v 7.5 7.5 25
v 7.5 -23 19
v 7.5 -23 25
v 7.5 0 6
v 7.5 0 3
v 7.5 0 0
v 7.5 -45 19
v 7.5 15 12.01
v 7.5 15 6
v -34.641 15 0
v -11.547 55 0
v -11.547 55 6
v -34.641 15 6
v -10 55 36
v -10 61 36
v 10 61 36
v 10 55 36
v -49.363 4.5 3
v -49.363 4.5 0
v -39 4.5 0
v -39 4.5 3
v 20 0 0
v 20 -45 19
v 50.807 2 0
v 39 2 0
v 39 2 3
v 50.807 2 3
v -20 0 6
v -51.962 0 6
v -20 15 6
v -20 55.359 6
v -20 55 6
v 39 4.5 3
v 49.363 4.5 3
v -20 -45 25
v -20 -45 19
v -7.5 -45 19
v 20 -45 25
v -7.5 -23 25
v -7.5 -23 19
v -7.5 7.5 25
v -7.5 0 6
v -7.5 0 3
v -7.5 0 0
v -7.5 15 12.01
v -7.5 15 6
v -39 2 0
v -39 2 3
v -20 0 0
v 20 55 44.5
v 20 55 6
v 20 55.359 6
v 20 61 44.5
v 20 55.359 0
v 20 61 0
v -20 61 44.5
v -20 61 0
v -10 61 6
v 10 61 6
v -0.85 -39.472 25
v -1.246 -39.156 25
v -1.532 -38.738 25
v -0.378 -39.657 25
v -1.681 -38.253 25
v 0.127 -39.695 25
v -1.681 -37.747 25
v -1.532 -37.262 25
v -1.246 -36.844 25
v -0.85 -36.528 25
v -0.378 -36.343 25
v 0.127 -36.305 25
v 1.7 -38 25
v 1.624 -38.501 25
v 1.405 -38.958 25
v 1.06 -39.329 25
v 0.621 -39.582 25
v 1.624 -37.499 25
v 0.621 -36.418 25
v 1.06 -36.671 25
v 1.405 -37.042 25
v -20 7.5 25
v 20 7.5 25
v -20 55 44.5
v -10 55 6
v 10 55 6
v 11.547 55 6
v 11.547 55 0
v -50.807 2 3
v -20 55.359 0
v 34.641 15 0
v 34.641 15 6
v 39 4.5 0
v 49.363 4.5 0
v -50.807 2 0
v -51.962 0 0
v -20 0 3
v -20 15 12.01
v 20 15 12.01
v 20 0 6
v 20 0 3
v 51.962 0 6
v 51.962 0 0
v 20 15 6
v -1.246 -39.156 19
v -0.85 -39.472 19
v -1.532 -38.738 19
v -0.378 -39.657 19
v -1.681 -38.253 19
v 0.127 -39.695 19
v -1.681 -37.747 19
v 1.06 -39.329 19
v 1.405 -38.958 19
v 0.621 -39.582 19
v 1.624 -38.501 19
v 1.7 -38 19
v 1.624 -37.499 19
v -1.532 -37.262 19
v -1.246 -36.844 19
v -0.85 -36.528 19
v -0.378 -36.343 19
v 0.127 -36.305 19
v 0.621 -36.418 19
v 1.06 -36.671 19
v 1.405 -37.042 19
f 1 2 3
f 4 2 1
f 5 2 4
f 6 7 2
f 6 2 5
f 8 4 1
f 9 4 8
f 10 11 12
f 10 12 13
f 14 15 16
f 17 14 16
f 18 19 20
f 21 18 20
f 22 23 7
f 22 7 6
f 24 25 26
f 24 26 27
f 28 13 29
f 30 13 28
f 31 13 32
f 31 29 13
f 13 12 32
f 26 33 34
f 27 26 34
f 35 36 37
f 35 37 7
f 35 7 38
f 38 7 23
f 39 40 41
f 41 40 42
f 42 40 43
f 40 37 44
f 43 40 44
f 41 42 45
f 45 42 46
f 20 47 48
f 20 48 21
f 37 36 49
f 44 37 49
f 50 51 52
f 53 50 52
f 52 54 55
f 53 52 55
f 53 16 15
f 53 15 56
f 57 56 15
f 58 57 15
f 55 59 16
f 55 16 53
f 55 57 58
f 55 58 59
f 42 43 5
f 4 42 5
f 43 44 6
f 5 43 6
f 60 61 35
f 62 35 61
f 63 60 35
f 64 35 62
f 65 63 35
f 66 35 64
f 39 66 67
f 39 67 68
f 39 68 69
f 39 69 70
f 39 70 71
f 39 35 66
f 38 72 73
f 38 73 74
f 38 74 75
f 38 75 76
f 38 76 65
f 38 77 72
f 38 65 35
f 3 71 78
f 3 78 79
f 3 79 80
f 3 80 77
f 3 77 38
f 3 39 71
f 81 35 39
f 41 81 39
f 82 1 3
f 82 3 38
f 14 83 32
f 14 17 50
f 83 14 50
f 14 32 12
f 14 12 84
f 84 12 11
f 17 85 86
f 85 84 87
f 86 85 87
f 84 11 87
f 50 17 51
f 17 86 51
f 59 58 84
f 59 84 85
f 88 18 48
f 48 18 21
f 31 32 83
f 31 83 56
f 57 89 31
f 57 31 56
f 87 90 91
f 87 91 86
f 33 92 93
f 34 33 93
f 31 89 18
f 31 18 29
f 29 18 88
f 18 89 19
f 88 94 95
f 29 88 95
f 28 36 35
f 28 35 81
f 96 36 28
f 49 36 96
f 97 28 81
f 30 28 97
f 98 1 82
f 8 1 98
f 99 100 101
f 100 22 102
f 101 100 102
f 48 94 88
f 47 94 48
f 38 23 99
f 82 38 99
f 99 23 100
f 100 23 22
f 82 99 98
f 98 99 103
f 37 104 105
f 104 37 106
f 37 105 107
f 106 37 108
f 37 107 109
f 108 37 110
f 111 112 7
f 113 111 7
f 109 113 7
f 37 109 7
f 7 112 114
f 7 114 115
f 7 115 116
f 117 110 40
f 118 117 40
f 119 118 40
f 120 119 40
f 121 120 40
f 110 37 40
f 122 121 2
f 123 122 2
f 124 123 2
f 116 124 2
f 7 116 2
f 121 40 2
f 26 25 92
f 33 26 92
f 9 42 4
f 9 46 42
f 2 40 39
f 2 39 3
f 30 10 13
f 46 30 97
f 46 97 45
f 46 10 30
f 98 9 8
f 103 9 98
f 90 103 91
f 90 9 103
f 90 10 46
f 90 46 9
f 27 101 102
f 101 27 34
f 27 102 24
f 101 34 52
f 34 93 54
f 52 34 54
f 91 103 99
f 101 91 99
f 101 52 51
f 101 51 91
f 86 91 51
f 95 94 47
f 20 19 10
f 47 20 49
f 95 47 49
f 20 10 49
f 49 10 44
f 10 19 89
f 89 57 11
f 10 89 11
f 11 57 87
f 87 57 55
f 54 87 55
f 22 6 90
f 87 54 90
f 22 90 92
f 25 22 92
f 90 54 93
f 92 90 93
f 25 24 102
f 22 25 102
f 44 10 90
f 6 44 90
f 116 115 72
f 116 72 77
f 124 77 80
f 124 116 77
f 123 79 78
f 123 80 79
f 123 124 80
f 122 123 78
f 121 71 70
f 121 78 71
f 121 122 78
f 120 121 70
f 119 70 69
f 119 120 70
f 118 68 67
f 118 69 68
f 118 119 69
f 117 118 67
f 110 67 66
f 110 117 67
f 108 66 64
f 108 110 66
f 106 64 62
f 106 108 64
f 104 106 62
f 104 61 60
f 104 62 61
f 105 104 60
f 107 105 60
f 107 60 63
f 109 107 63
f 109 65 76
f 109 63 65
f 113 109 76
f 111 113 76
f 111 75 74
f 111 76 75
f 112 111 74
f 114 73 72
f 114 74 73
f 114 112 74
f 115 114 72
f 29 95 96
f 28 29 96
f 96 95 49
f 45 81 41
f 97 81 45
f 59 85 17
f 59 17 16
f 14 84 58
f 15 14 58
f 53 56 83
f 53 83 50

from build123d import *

# Parameters (mm, degrees)
BOX031_W                 = 46
BOX031_H                 = 15
BOX031_DEPTH             = 16
BOX029_W                 = 78
BOX029_H                 = 15
BOX029_DEPTH             = 6
BOX023_W                 = 220
BOX023_H                 = 2.5
BOX023_DEPTH             = 3
EXTRUDE011_DEPTH         = 10
BOX024_W                 = 220
BOX024_H                 = 113
BOX024_DEPTH             = 8
BOX026_W                 = 32
BOX026_H                 = 6
BOX026_DEPTH             = 6
PRISM004_DEPTH           = 6
PRISM004_PLACEMENT_ANGLE = 30
PRISM005_DEPTH           = 6
PRISM005_PLACEMENT_ANGLE = 30
EXTRUDE012_DEPTH         = 12.5
EXTRUDE009_DEPTH         = 12.5
EXTRUDE008_DEPTH         = 12.5
BOX009_W                 = 12.5
BOX009_H                 = 7.5
BOX009_DEPTH             = 22
BOX010_W                 = 12.5
BOX010_H                 = 7.5
BOX010_DEPTH             = 22
CYLINDER_R               = 1.7
CYLINDER_DEPTH           = 30
BOX007_W                 = 15
BOX007_H                 = 70
BOX007_DEPTH             = 6
BOX006_W                 = 40
BOX006_H                 = 51
BOX006_DEPTH             = 6
EXTRUDE010_DEPTH         = 12.5
BOX021_W                 = 12.5
BOX021_H                 = 7.5
BOX021_DEPTH             = 22
BOX027_W                 = 12.5
BOX027_H                 = 7.5
BOX027_DEPTH             = 22
CYLINDER002_R            = 1.7
CYLINDER002_DEPTH        = 30
BOX025_W                 = 15
BOX025_H                 = 70
BOX025_DEPTH             = 6
BOX022_W                 = 40
BOX022_H                 = 51
BOX022_DEPTH             = 6
BOX005_W                 = 20
BOX005_H                 = 6
BOX005_DEPTH             = 30
BOX004_W                 = 40
BOX004_H                 = 6
BOX004_DEPTH             = 44.5


with BuildPart() as cube030:
    # Box031 → Box031 (new body)
    with BuildSketch(Plane(origin=(-22, 15, 0), x_dir=(1, 0, 0), z_dir=(0, 0, 1))):
        with Locations((23, 7.5)):
            Rectangle(BOX031_W, BOX031_H)
    extrude(amount=BOX031_DEPTH)


with BuildPart() as cube028:
    # Box029 → Box029 (new body)
    with BuildSketch(Plane(origin=(-39, 0, 0), x_dir=(1, 0, 0), z_dir=(0, 0, 1))):
        with Locations((39, 7.5)):
            Rectangle(BOX029_W, BOX029_H)
    extrude(amount=BOX029_DEPTH)


with BuildPart() as cube022:
    # Box023 → Box023 (new body)
    with BuildSketch(Plane(origin=(-110, 2, 0), x_dir=(1, 0, 0), z_dir=(0, 0, 1))):
        with Locations((110, 1.25)):
            Rectangle(BOX023_W, BOX023_H)
    extrude(amount=BOX023_DEPTH)


with BuildPart() as extrude011:
    # Sketch009 → Extrude011 (new body)
    with BuildSketch(Plane.XY):
        Polygon((-95, 0), (95, 0), (85, 61), (-85, 61), align=None)
    extrude(amount=EXTRUDE011_DEPTH)


with BuildPart() as molde_cortador002:
    # Box024 → Box024 (new body)
    with BuildSketch(Plane(origin=(-110, -15, 0), x_dir=(1, 0, 0), z_dir=(0, 0, 1))):
        with Locations((110, 56.5)):
            Rectangle(BOX024_W, BOX024_H)
    extrude(amount=BOX024_DEPTH)

    # Cut004020: cut Extrude011
    add(extrude011.part, mode=Mode.SUBTRACT)


with BuildPart() as cube025:
    # Box026 → Box026 (new body)
    with BuildSketch(Plane(origin=(-16, 55, 0), x_dir=(1, 0, 0), z_dir=(0, 0, 1))):
        with Locations((16, 3)):
            Rectangle(BOX026_W, BOX026_H)
    extrude(amount=BOX026_DEPTH)


with BuildPart() as prism004:
    # Prism004 → Prism004 (new body)
    with BuildSketch(Plane.XY):
        Polygon((45, 0), (-22.5, 38.971143), (-22.5, -38.971143), align=None)
    extrude(amount=PRISM004_DEPTH)


with BuildPart() as prism004_1:
    # Prism004 placement: moved
    add(prism004.part.moved(Location((0, 23, 0))).rotate(Axis((0, 23, 0), (0, 0, -1)), PRISM004_PLACEMENT_ANGLE))


with BuildPart() as base_triangulo_con_canaleta001:
    # Prism005 → Prism005 (new body)
    with BuildSketch(Plane.XY):
        Polygon((60, 0), (-30, 51.961524), (-30, -51.961524), align=None)
    extrude(amount=PRISM005_DEPTH)


with BuildPart() as base_triangulo_con_canaleta001_1:
    # Prism005 placement: moved
    add(base_triangulo_con_canaleta001.part.moved(Location((0, 23, 0))).rotate(Axis((0, 23, 0), (0, 0, -1)), PRISM005_PLACEMENT_ANGLE))

    # Cut004019: cut Prism004
    add(prism004_1.part, mode=Mode.SUBTRACT)


with BuildPart() as base_triangulo_con_canaleta001_2:
    # Cut004019 placement: moved
    add(base_triangulo_con_canaleta001_1.part.moved(Location((0, 7, 0))))

    # Fusion004005: union Cube025
    add(cube025.part)

    # Cut004015: cut molde_cortador002
    add(molde_cortador002.part, mode=Mode.SUBTRACT)

    # Cut004016: cut Cube022
    add(cube022.part, mode=Mode.SUBTRACT)


with BuildPart() as extrude012:
    # Sketch010 (on Face21 of Fusion004006) → Extrude012 (new body)
    with BuildSketch(Plane(origin=(-20, 0, 0), x_dir=(0, -1, 0), z_dir=(-1, 0, 0))):
        Polygon((-7.5, 0), (-7.5, 25), (-21.933757, 0), align=None)
    extrude(amount=-EXTRUDE012_DEPTH)


with BuildPart() as extrude012_1:
    # Extrude012 placement: moved
    add(extrude012.part.moved(Location((27.5, 0, 0))))


with BuildPart() as extrude009:
    # Sketch007 (on Face17 of Fusion004002) → Extrude009 (new body)
    with BuildSketch(Plane(origin=(-20, 0, 0), x_dir=(0, -1, 0), z_dir=(-1, 0, 0))):
        Polygon((0, 0), (0, 19), (45, 19), align=None)
    extrude(amount=EXTRUDE009_DEPTH)


with BuildPart() as extrude009_1:
    # Extrude009 placement: moved
    add(extrude009.part.moved(Location((40, 0, 0))))


with BuildPart() as extrude008:
    # Sketch007 (on Face17 of Fusion004002) → Extrude008 (new body)
    with BuildSketch(Plane(origin=(-20, 0, 0), x_dir=(0, -1, 0), z_dir=(-1, 0, 0))):
        Polygon((0, 0), (0, 19), (45, 19), align=None)
    extrude(amount=-EXTRUDE008_DEPTH)


with BuildPart() as cube008:
    # Box009 → Box009 (new body)
    with BuildSketch(Plane(origin=(7.5, 0, 3), x_dir=(1, 0, 0), z_dir=(0, 0, 1))):
        with Locations((6.25, 3.75)):
            Rectangle(BOX009_W, BOX009_H)
    extrude(amount=BOX009_DEPTH)


with BuildPart() as cube009:
    # Box010 → Box010 (new body)
    with BuildSketch(Plane(origin=(-20, 0, 3), x_dir=(1, 0, 0), z_dir=(0, 0, 1))):
        with Locations((6.25, 3.75)):
            Rectangle(BOX010_W, BOX010_H)
    extrude(amount=BOX010_DEPTH)


with BuildPart() as cylinder:
    # Cylinder → Cylinder (new body)
    with BuildSketch(Plane(origin=(0, 7, 0), x_dir=(1, 0, 0), z_dir=(0, 0, 1))):
        Circle(CYLINDER_R)
    extrude(amount=CYLINDER_DEPTH)


with BuildPart() as cube007:
    # Box007 → Box007 (new body)
    with BuildSketch(Plane(origin=(12.5, 22, 20), x_dir=(1, 0, 0), z_dir=(0, 0, 1))):
        with Locations((7.5, 35)):
            Rectangle(BOX007_W, BOX007_H)
    extrude(amount=BOX007_DEPTH)


with BuildPart() as fusion004002:
    # Box006 → Box006 (new body)
    with BuildSketch(Plane.XY.offset(20)):
        with Locations((20, 25.5)):
            Rectangle(BOX006_W, BOX006_H)
    extrude(amount=BOX006_DEPTH)

    # Cut004005: cut Cube007
    add(cube007.part, mode=Mode.SUBTRACT)


with BuildPart() as fusion004002_1:
    # Cut004005 placement: moved
    add(fusion004002.part.moved(Location((-20, 0, -1))))

    # Cut004006: cut Cylinder
    add(cylinder.part, mode=Mode.SUBTRACT)


with BuildPart() as fusion004002_2:
    # Cut004006 placement: moved
    add(fusion004002_1.part.moved(Location((0, -45, 0))))

    # Fusion004002: union Cube008, Cube009
    add(cube008.part)
    add(cube009.part)


with BuildPart() as fusion004007:
    # Sketch008 (on Face21 of Fusion004002) → Extrude010 (new body)
    with BuildSketch(Plane(origin=(-20, 0, 0), x_dir=(0, -1, 0), z_dir=(-1, 0, 0))):
        Polygon((-7.5, 0), (-7.5, 25), (-21.933757, 0), align=None)
    extrude(amount=-EXTRUDE010_DEPTH)

    # Fusion004007: union Extrude012, Extrude009, Extrude008, Fusion004002
    add(extrude012_1.part)
    add(extrude009_1.part)
    add(extrude008.part)
    add(fusion004002_2.part)


with BuildPart() as cube020:
    # Box021 → Box021 (new body)
    with BuildSketch(Plane(origin=(7.5, 0, 3), x_dir=(1, 0, 0), z_dir=(0, 0, 1))):
        with Locations((6.25, 3.75)):
            Rectangle(BOX021_W, BOX021_H)
    extrude(amount=BOX021_DEPTH)


with BuildPart() as cube026:
    # Box027 → Box027 (new body)
    with BuildSketch(Plane(origin=(-20, 0, 3), x_dir=(1, 0, 0), z_dir=(0, 0, 1))):
        with Locations((6.25, 3.75)):
            Rectangle(BOX027_W, BOX027_H)
    extrude(amount=BOX027_DEPTH)


with BuildPart() as cylinder002:
    # Cylinder002 → Cylinder002 (new body)
    with BuildSketch(Plane(origin=(0, 7, 0), x_dir=(1, 0, 0), z_dir=(0, 0, 1))):
        Circle(CYLINDER002_R)
    extrude(amount=CYLINDER002_DEPTH)


with BuildPart() as cube024:
    # Box025 → Box025 (new body)
    with BuildSketch(Plane(origin=(12.5, 22, 20), x_dir=(1, 0, 0), z_dir=(0, 0, 1))):
        with Locations((7.5, 35)):
            Rectangle(BOX025_W, BOX025_H)
    extrude(amount=BOX025_DEPTH)


with BuildPart() as parte_frontal:
    # Box022 → Box022 (new body)
    with BuildSketch(Plane.XY.offset(20)):
        with Locations((20, 25.5)):
            Rectangle(BOX022_W, BOX022_H)
    extrude(amount=BOX022_DEPTH)

    # Cut004017: cut Cube024
    add(cube024.part, mode=Mode.SUBTRACT)


with BuildPart() as parte_frontal_1:
    # Cut004017 placement: moved
    add(parte_frontal.part.moved(Location((-20, 0, -1))))

    # Cut004018: cut Cylinder002
    add(cylinder002.part, mode=Mode.SUBTRACT)


with BuildPart() as parte_frontal_2:
    # Cut004018 placement: moved
    add(parte_frontal_1.part.moved(Location((0, -45, 0))))

    # Fusion004006: union Cube020, Cube026
    add(cube020.part)
    add(cube026.part)

    # Fusion004008: union Fusion004007
    add(fusion004007.part)


with BuildPart() as cube005:
    # Box005 → Box005 (new body)
    with BuildSketch(Plane(origin=(-10, 55, 6), x_dir=(1, 0, 0), z_dir=(0, 0, 1))):
        with Locations((10, 3)):
            Rectangle(BOX005_W, BOX005_H)
    extrude(amount=BOX005_DEPTH)


with BuildPart() as cut004022:
    # Box004 → Box004 (new body)
    with BuildSketch(Plane(origin=(-20, 55, 0), x_dir=(1, 0, 0), z_dir=(0, 0, 1))):
        with Locations((20, 3)):
            Rectangle(BOX004_W, BOX004_H)
    extrude(amount=BOX004_DEPTH)

    # Cut004004: cut Cube005
    add(cube005.part, mode=Mode.SUBTRACT)

    # Fusion004009: union base_triangulo_con_canaleta001, parte_frontal
    add(base_triangulo_con_canaleta001_2.part)
    add(parte_frontal_2.part)

    # Fusion004009002: union Cube028
    add(cube028.part)

    # Cut004022: cut Cube030
    add(cube030.part, mode=Mode.SUBTRACT)


solid = cut004022.part
